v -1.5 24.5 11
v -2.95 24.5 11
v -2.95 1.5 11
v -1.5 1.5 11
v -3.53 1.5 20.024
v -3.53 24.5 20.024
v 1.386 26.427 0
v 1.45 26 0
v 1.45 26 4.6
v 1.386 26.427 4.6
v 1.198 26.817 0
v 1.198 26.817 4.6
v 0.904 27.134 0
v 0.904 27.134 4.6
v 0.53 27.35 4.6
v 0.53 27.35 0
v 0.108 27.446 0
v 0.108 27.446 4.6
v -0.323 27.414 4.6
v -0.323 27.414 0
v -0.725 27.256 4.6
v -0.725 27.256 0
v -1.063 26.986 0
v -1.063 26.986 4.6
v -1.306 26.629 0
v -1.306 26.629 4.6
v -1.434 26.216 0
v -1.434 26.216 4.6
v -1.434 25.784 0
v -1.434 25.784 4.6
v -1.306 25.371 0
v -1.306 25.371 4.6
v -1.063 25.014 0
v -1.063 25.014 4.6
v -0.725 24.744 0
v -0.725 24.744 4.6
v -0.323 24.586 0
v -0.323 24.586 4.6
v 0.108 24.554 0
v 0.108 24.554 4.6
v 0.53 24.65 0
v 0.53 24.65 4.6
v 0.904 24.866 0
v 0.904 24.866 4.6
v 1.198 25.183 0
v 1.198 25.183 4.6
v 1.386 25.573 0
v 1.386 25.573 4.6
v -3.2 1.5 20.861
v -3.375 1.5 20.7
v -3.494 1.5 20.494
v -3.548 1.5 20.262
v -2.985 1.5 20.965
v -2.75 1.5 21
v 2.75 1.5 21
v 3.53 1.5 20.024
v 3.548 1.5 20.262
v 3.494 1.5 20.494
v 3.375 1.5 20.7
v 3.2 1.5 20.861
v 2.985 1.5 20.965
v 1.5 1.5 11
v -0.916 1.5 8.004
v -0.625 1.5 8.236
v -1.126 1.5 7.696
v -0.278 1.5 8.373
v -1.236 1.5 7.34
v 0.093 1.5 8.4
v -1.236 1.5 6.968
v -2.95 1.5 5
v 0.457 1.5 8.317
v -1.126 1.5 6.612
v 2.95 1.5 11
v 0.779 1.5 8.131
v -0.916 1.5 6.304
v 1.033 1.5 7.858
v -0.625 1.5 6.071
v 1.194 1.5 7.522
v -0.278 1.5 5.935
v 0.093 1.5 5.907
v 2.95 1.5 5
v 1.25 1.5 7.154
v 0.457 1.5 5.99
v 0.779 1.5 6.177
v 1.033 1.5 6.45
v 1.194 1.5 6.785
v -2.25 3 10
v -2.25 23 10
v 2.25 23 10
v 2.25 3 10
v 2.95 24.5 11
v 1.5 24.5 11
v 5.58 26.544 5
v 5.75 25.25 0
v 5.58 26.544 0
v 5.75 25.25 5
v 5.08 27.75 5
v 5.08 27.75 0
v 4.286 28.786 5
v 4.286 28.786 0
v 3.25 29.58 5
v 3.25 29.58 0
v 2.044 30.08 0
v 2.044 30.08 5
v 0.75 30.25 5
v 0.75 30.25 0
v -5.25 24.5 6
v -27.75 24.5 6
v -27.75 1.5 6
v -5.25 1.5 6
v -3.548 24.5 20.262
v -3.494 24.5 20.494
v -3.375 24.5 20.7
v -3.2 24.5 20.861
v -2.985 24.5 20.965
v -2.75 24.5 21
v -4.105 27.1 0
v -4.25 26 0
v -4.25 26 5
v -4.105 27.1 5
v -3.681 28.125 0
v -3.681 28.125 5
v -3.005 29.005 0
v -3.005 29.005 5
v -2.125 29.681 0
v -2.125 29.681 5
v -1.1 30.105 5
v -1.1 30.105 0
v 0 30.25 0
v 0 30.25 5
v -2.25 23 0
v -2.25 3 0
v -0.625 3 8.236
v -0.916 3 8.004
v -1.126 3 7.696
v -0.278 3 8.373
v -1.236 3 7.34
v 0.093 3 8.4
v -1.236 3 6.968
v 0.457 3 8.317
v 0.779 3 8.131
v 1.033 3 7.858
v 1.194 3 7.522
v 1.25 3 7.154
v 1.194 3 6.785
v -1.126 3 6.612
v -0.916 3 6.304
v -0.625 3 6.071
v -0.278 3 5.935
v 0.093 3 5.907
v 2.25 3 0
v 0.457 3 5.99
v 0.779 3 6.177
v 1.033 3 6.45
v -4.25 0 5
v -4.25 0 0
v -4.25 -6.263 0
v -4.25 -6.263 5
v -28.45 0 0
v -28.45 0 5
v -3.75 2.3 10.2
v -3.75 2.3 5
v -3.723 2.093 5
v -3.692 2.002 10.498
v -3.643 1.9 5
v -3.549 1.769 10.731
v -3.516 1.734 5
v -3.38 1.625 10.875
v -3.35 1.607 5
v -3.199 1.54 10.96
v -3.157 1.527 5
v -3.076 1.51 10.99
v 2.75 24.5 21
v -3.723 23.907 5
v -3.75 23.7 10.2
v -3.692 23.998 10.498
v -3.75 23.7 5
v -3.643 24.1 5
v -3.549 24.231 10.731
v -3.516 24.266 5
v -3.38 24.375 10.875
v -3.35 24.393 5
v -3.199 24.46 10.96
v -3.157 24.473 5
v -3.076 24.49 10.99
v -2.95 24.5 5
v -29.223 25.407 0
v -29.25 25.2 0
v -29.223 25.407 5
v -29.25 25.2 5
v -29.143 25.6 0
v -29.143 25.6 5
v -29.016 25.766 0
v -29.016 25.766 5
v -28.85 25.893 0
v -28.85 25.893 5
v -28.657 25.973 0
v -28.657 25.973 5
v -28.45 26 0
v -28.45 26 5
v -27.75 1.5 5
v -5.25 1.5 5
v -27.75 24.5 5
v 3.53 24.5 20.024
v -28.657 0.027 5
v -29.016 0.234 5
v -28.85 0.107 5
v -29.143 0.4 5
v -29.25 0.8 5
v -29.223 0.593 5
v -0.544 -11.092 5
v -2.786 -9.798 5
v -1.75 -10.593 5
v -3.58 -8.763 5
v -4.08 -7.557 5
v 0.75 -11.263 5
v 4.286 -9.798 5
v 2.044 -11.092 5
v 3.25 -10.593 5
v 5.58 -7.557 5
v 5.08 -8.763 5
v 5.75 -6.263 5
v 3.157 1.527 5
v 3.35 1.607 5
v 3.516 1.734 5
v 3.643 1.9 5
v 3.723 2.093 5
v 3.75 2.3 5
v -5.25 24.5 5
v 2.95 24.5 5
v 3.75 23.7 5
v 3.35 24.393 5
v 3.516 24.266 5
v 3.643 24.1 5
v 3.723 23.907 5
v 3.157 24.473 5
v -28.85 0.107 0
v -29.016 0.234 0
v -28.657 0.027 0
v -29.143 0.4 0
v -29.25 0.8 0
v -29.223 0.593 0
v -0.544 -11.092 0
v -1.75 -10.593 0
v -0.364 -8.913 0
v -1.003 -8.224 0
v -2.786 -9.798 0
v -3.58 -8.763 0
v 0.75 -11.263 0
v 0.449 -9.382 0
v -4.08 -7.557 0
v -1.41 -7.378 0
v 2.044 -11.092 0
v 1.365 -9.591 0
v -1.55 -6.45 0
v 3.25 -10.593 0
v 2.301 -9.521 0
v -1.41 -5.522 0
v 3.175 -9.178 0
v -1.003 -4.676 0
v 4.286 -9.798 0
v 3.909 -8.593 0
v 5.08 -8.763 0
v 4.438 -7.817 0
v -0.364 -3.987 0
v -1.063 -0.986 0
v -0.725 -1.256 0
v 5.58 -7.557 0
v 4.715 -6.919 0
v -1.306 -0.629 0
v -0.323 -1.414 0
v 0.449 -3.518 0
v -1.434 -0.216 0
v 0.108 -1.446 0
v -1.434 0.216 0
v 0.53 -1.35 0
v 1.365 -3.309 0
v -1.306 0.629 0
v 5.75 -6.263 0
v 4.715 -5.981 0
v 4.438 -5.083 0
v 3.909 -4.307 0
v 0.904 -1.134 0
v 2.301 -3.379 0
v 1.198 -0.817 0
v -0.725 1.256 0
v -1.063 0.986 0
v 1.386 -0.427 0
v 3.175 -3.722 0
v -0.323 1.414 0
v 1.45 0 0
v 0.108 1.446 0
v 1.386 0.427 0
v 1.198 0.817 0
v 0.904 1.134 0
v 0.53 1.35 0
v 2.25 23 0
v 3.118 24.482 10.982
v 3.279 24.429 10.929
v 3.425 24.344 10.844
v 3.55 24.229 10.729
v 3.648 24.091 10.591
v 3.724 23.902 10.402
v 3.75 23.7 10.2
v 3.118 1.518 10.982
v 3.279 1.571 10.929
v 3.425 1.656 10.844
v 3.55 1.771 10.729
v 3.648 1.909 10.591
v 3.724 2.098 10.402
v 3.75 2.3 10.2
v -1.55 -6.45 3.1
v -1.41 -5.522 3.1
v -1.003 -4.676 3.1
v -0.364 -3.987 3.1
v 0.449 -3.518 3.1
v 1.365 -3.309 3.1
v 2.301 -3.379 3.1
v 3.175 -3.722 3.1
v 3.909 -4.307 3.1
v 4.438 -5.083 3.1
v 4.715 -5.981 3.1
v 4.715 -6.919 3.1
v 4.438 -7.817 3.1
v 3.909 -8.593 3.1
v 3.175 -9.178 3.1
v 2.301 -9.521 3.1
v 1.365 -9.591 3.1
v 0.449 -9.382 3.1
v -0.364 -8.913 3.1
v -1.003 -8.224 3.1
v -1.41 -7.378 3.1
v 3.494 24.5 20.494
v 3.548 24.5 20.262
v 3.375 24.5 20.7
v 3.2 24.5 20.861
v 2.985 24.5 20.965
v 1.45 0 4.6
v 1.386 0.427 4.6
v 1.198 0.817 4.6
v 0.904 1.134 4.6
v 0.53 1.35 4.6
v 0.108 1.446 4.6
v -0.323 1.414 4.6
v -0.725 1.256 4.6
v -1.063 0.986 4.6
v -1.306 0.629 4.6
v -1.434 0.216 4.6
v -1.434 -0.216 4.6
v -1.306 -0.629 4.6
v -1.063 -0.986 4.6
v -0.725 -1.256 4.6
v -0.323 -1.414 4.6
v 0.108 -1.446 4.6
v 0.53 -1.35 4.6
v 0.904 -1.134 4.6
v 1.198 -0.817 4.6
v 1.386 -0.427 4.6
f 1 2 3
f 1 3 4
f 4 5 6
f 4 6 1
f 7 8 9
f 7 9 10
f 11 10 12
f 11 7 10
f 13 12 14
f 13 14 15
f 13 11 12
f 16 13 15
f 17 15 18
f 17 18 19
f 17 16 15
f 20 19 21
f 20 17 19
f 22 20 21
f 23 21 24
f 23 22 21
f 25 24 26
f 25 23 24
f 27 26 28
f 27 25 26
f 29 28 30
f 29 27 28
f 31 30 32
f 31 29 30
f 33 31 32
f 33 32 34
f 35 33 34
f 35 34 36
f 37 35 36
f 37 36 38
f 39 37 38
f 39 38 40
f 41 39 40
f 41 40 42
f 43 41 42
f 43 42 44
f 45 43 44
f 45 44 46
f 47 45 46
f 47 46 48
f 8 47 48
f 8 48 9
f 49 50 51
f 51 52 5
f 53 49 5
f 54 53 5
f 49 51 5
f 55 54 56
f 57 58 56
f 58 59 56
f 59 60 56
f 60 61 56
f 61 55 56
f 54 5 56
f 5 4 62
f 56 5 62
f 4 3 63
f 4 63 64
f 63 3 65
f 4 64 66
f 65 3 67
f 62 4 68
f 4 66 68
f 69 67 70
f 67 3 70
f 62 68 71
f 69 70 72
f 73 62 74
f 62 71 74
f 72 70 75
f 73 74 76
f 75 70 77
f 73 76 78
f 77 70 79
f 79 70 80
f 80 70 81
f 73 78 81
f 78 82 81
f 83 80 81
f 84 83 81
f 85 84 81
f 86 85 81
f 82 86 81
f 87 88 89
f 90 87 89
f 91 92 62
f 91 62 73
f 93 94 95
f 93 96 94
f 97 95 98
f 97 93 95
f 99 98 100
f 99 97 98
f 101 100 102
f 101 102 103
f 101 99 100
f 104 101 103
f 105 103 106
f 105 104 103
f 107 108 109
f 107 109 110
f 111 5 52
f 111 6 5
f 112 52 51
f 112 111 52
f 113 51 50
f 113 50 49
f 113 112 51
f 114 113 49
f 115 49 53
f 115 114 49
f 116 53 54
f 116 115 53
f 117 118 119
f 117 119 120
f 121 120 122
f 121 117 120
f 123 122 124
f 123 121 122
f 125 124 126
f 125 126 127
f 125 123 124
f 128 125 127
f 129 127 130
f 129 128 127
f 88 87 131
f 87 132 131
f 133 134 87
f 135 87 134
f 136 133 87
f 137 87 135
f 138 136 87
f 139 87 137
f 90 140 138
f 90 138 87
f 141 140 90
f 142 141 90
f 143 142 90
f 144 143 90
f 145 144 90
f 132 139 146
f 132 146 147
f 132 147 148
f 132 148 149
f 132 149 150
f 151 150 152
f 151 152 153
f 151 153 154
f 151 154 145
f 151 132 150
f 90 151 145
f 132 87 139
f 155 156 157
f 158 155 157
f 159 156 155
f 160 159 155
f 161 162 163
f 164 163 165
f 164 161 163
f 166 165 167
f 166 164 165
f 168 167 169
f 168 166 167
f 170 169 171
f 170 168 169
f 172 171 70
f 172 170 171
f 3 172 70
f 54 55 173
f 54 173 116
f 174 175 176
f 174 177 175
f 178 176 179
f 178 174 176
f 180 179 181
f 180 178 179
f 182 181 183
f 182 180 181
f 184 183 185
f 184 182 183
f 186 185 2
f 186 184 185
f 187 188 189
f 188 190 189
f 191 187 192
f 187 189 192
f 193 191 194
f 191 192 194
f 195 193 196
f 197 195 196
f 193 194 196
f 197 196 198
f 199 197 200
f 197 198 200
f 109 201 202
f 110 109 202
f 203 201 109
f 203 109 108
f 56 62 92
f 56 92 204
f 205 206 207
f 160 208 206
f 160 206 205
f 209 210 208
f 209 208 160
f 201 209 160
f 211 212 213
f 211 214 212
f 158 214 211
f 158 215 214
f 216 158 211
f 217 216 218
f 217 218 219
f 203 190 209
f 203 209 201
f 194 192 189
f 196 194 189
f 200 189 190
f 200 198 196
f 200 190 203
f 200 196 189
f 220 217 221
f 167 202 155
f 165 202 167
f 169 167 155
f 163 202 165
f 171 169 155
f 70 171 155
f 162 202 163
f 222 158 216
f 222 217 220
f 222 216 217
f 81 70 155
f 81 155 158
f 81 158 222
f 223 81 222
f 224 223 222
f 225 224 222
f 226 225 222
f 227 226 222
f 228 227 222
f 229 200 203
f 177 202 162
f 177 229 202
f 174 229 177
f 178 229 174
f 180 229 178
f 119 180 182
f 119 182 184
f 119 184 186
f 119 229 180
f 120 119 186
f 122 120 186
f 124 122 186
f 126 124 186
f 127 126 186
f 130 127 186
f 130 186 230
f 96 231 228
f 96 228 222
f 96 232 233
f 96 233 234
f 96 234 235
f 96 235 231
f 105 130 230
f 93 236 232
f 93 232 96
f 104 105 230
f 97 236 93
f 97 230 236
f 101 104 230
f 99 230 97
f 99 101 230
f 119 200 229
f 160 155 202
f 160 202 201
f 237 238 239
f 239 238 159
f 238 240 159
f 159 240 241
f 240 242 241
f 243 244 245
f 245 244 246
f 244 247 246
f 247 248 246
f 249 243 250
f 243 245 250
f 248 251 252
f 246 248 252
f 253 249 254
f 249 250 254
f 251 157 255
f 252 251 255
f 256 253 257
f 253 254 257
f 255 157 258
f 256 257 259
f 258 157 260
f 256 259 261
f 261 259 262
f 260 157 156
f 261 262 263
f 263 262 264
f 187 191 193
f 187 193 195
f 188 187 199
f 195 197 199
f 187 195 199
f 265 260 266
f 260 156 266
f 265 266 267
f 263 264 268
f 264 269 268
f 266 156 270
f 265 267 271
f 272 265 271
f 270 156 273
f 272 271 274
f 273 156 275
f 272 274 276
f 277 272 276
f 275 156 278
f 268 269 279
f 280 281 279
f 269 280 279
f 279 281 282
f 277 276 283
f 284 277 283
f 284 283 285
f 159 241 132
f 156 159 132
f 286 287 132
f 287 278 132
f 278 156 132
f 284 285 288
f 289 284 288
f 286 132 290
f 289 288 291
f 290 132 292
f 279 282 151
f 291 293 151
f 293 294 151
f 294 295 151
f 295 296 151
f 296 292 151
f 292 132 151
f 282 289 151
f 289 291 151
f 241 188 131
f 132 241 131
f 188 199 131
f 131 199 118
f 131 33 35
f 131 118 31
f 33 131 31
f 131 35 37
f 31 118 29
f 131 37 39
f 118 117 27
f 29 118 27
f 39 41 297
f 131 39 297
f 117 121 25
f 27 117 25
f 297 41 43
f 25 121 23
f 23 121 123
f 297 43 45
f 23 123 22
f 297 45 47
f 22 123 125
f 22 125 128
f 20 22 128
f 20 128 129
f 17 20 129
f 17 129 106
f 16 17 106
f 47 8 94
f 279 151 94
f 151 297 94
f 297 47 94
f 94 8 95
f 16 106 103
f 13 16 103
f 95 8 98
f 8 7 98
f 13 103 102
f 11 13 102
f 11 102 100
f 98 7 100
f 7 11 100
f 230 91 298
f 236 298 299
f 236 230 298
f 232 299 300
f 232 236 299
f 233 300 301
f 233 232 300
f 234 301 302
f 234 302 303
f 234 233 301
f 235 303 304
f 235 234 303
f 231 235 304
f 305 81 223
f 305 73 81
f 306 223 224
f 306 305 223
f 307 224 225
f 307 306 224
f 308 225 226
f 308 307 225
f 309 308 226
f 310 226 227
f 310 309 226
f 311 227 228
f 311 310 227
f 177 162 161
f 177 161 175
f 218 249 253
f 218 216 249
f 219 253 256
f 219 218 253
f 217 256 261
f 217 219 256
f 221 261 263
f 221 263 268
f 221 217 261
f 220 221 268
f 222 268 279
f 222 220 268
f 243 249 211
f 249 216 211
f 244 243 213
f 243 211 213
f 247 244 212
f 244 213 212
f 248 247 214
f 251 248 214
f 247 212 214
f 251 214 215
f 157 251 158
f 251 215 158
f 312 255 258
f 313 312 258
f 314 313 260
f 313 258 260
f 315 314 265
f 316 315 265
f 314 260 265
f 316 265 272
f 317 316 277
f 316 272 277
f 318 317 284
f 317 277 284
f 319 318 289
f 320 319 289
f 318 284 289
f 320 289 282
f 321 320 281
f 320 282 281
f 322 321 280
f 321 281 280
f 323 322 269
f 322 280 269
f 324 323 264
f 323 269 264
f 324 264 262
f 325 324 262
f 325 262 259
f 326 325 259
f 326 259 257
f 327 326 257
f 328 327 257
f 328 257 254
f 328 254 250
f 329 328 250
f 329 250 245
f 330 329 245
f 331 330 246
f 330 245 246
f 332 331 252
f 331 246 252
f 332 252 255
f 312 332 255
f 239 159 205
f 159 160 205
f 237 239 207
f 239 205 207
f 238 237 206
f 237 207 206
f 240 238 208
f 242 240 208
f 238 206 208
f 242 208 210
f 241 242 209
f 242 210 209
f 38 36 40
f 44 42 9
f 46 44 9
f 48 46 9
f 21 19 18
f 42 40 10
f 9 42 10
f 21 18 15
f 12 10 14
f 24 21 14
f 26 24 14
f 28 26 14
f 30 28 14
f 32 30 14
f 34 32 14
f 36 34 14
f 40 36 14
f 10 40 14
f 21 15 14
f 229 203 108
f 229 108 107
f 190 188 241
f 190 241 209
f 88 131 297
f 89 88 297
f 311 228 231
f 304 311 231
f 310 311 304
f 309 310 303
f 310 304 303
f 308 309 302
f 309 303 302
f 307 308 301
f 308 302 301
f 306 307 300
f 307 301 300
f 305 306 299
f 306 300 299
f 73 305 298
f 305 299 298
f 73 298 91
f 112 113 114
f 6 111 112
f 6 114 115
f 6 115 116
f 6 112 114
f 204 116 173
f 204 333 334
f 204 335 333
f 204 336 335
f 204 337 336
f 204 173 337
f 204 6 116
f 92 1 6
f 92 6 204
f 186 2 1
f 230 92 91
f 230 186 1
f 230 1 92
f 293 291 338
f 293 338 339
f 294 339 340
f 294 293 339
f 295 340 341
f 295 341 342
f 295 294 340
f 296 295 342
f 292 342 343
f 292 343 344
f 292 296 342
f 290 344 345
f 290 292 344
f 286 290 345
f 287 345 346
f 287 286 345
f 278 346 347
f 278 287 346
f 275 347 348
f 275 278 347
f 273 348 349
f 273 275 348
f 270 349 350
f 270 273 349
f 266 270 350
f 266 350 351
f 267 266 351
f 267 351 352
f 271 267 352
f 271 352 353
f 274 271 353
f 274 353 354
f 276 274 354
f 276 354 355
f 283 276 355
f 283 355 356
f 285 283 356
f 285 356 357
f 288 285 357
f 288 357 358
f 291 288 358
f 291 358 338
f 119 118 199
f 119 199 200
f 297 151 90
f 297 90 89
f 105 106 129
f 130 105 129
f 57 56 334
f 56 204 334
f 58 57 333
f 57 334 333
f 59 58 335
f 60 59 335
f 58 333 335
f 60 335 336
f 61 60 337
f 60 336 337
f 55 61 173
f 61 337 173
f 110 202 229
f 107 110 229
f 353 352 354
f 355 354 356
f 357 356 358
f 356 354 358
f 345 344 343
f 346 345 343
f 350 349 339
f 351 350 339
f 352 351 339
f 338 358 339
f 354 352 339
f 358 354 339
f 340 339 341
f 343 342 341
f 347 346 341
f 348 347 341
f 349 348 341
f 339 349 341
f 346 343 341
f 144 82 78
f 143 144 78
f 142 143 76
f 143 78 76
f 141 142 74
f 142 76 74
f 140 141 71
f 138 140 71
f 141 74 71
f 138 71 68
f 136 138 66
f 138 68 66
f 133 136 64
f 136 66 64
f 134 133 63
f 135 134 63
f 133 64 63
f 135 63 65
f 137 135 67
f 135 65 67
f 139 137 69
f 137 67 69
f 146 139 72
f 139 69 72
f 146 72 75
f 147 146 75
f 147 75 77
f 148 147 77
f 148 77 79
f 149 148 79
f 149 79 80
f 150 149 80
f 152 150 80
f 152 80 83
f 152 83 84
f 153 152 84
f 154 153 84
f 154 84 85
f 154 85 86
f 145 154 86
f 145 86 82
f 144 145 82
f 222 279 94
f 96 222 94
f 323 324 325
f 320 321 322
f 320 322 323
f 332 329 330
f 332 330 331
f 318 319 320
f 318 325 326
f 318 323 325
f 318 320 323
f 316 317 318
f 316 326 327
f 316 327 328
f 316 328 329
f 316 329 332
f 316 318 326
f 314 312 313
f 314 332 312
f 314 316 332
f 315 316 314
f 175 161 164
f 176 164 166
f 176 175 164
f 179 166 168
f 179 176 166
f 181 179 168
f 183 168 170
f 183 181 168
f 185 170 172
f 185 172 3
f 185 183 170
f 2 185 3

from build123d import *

# Parameters (mm, degrees)
SKETCH1_R           = 1.45
SKETCH1_W           = 4.5
SKETCH1_H           = 20
BOSS_EXTRUDE1_DEPTH = 5
SKETCH2_W           = 7.5
SKETCH2_H           = 23
SKETCH2_W_2         = 4.5
SKETCH2_H_2         = 20
BOSS_EXTRUDE2_DEPTH = 5
SKETCH3_W           = 7.5
SKETCH3_H           = 23
BOSS_EXTRUDE3_DEPTH = 1
CUT_EXTRUDE1_REACH  = 33.075
SKETCH6_R           = 1.25
SKETCH7_W           = 5
SKETCH7_H           = 26
BOSS_EXTRUDE4_DEPTH = 25
SKETCH8_W           = 22.5
SKETCH8_H           = 23
BOSS_EXTRUDE5_DEPTH = 1
BOSS_EXTRUDE6_DEPTH = 23
FILLET1_R           = 0.8
BOSS_EXTRUDE7_START = -5
BOSS_EXTRUDE7_DEPTH = 5
BOSS_EXTRUDE8_START = -5
BOSS_EXTRUDE8_DEPTH = 5
SKETCH12_R          = 3.15
CUT_EXTRUDE2_DEPTH  = 3.1
FILLET2_R           = 5
BOSS_EXTRUDE9_START = -0.4
SKETCH14_R          = 1.45
BOSS_EXTRUDE9_DEPTH = 0.4


with BuildPart() as part:
    # Sketch1 → Boss-Extrude1 (new body)
    with BuildSketch(Plane.XY):
        with BuildLine():
            Line((-4.25, 0), (-4.25, 26))
            ThreePointArc((-4.25, 26), (0, 30.25), (4.25, 26))
            Line((4.25, 26), (4.25, 0))
            ThreePointArc((4.25, 0), (0, -4.25), (-4.25, 0))
        make_face()
        with Locations((0, 26)):
            Circle(SKETCH1_R, mode=Mode.SUBTRACT)
        Circle(SKETCH1_R, mode=Mode.SUBTRACT)
        with Locations((0, 13)):
            Rectangle(SKETCH1_W, SKETCH1_H, mode=Mode.SUBTRACT)
    extrude(amount=BOSS_EXTRUDE1_DEPTH)

    # Sketch2 → Boss-Extrude2 (add)
    with BuildSketch(Plane.XY.offset(5)):
        with Locations((0, 13)):
            Rectangle(SKETCH2_W, SKETCH2_H)
        with Locations((0, 13)):
            Rectangle(SKETCH2_W_2, SKETCH2_H_2, mode=Mode.SUBTRACT)
    extrude(amount=BOSS_EXTRUDE2_DEPTH)

    # Sketch3 → Boss-Extrude3 (add)
    with BuildSketch(Plane.XY.offset(10)):
        with Locations((0, 13)):
            Rectangle(SKETCH3_W, SKETCH3_H)
    extrude(amount=BOSS_EXTRUDE3_DEPTH)

    # Sketch6 → Cut-Extrude1 (cut, up to next)
    with BuildSketch(Plane.XZ.offset(-1.5), mode=Mode.PRIVATE) as cut_extrude1_sk1:
        with Locations((0, 7.153891294)):
            Circle(SKETCH6_R)
    cut_extrude1_tool1 = extrude(cut_extrude1_sk1.sketch, amount=-CUT_EXTRUDE1_REACH, mode=Mode.PRIVATE) & part.part
    add(cut_extrude1_tool1.solids().sort_by_distance((0, 1.5, 7.153891))[0], mode=Mode.SUBTRACT)

    # Sketch7 → Boss-Extrude4 (add)
    with BuildSketch(Plane.ZY.offset(4.25)):
        with Locations((2.5, 13)):
            Rectangle(SKETCH7_W, SKETCH7_H)
    extrude(amount=BOSS_EXTRUDE4_DEPTH)

    # Sketch8 → Boss-Extrude5 (add)
    with BuildSketch(Plane.XY.offset(5)):
        with Locations((-16.5, 13)):
            Rectangle(SKETCH8_W, SKETCH8_H)
    extrude(amount=BOSS_EXTRUDE5_DEPTH)

    # Sketch10 → Boss-Extrude6 (add)
    with BuildSketch(Plane.XZ.offset(-1.5)):
        Polygon((-1.5, 11), (1.5, 11), (3.75, 21), (-3.75, 21), align=None)
    extrude(amount=-BOSS_EXTRUDE6_DEPTH)

    # Fillet1
    fillet1_edges = [part.edges().sort_by_distance(p)[0] for p in [
        (-3.75, 13, 21),
        (3.75, 13, 21),
        (-3.75, 1.5, 8),
        (3.75, 1.5, 8),
        (3.75, 24.5, 8),
        (-3.75, 24.5, 8),
        (-3.75, 13, 11),
        (3.75, 13, 11),
        (-29.25, 26, 2.5),
        (-29.25, 0, 2.5),
    ]]
    fillet(fillet1_edges, radius=FILLET1_R)

    # Sketch11 → Boss-Extrude7 (add)
    with BuildSketch(Plane.XY.offset(5).offset(BOSS_EXTRUDE7_START)):
        with BuildLine():
            Line((-4.25, 0), (-4.25, -11.262558254))
            Line((-4.25, -11.262558254), (4.25, -11.262558254))
            Line((4.25, -11.262558254), (4.25, 0))
            ThreePointArc((4.25, 0), (0, -4.25), (-4.25, 0))
        make_face()
    extrude(amount=BOSS_EXTRUDE7_DEPTH)

    # Sketch13 → Boss-Extrude8 (add)
    with BuildSketch(Plane.XY.offset(5).offset(BOSS_EXTRUDE8_START)):
        with BuildLine():
            Line((4.25, -11.262558254), (5.75, -11.262558254))
            Line((5.75, -11.262558254), (5.75, 30.25))
            Line((5.75, 30.25), (0, 30.25))
            ThreePointArc((0, 30.25), (3.00520382, 29.00520382), (4.25, 26))
            Line((4.25, 26), (4.25, -11.262558254))
        make_face()
    extrude(amount=BOSS_EXTRUDE8_DEPTH)

    # Sketch12 → Cut-Extrude2 (cut)
    with BuildSketch(Plane(origin=(0, 0, 0), x_dir=(-1, 0, 0), z_dir=(0, 0, -1))):
        with Locations((-1.6, -6.45)):
            Circle(SKETCH12_R)
    extrude(amount=-CUT_EXTRUDE2_DEPTH, mode=Mode.SUBTRACT)

    # Fillet2
    fillet2_edges = [part.edges().sort_by_distance(p)[0] for p in [
        (5.75, 30.25, 2.5),
        (5.75, -11.262558254, 2.5),
        (-4.25, -11.262558254, 2.5),
    ]]
    fillet(fillet2_edges, radius=FILLET2_R - 0.0001)  # a hair under: the kernel refuses the full size

    # Sketch14 → Boss-Extrude9 (add)
    with BuildSketch(Plane.XY.offset(5).offset(BOSS_EXTRUDE9_START)):
        with Locations((0, 26)):
            Circle(SKETCH14_R)
        Circle(SKETCH14_R)
    extrude(amount=BOSS_EXTRUDE9_DEPTH)


solid = part.part
